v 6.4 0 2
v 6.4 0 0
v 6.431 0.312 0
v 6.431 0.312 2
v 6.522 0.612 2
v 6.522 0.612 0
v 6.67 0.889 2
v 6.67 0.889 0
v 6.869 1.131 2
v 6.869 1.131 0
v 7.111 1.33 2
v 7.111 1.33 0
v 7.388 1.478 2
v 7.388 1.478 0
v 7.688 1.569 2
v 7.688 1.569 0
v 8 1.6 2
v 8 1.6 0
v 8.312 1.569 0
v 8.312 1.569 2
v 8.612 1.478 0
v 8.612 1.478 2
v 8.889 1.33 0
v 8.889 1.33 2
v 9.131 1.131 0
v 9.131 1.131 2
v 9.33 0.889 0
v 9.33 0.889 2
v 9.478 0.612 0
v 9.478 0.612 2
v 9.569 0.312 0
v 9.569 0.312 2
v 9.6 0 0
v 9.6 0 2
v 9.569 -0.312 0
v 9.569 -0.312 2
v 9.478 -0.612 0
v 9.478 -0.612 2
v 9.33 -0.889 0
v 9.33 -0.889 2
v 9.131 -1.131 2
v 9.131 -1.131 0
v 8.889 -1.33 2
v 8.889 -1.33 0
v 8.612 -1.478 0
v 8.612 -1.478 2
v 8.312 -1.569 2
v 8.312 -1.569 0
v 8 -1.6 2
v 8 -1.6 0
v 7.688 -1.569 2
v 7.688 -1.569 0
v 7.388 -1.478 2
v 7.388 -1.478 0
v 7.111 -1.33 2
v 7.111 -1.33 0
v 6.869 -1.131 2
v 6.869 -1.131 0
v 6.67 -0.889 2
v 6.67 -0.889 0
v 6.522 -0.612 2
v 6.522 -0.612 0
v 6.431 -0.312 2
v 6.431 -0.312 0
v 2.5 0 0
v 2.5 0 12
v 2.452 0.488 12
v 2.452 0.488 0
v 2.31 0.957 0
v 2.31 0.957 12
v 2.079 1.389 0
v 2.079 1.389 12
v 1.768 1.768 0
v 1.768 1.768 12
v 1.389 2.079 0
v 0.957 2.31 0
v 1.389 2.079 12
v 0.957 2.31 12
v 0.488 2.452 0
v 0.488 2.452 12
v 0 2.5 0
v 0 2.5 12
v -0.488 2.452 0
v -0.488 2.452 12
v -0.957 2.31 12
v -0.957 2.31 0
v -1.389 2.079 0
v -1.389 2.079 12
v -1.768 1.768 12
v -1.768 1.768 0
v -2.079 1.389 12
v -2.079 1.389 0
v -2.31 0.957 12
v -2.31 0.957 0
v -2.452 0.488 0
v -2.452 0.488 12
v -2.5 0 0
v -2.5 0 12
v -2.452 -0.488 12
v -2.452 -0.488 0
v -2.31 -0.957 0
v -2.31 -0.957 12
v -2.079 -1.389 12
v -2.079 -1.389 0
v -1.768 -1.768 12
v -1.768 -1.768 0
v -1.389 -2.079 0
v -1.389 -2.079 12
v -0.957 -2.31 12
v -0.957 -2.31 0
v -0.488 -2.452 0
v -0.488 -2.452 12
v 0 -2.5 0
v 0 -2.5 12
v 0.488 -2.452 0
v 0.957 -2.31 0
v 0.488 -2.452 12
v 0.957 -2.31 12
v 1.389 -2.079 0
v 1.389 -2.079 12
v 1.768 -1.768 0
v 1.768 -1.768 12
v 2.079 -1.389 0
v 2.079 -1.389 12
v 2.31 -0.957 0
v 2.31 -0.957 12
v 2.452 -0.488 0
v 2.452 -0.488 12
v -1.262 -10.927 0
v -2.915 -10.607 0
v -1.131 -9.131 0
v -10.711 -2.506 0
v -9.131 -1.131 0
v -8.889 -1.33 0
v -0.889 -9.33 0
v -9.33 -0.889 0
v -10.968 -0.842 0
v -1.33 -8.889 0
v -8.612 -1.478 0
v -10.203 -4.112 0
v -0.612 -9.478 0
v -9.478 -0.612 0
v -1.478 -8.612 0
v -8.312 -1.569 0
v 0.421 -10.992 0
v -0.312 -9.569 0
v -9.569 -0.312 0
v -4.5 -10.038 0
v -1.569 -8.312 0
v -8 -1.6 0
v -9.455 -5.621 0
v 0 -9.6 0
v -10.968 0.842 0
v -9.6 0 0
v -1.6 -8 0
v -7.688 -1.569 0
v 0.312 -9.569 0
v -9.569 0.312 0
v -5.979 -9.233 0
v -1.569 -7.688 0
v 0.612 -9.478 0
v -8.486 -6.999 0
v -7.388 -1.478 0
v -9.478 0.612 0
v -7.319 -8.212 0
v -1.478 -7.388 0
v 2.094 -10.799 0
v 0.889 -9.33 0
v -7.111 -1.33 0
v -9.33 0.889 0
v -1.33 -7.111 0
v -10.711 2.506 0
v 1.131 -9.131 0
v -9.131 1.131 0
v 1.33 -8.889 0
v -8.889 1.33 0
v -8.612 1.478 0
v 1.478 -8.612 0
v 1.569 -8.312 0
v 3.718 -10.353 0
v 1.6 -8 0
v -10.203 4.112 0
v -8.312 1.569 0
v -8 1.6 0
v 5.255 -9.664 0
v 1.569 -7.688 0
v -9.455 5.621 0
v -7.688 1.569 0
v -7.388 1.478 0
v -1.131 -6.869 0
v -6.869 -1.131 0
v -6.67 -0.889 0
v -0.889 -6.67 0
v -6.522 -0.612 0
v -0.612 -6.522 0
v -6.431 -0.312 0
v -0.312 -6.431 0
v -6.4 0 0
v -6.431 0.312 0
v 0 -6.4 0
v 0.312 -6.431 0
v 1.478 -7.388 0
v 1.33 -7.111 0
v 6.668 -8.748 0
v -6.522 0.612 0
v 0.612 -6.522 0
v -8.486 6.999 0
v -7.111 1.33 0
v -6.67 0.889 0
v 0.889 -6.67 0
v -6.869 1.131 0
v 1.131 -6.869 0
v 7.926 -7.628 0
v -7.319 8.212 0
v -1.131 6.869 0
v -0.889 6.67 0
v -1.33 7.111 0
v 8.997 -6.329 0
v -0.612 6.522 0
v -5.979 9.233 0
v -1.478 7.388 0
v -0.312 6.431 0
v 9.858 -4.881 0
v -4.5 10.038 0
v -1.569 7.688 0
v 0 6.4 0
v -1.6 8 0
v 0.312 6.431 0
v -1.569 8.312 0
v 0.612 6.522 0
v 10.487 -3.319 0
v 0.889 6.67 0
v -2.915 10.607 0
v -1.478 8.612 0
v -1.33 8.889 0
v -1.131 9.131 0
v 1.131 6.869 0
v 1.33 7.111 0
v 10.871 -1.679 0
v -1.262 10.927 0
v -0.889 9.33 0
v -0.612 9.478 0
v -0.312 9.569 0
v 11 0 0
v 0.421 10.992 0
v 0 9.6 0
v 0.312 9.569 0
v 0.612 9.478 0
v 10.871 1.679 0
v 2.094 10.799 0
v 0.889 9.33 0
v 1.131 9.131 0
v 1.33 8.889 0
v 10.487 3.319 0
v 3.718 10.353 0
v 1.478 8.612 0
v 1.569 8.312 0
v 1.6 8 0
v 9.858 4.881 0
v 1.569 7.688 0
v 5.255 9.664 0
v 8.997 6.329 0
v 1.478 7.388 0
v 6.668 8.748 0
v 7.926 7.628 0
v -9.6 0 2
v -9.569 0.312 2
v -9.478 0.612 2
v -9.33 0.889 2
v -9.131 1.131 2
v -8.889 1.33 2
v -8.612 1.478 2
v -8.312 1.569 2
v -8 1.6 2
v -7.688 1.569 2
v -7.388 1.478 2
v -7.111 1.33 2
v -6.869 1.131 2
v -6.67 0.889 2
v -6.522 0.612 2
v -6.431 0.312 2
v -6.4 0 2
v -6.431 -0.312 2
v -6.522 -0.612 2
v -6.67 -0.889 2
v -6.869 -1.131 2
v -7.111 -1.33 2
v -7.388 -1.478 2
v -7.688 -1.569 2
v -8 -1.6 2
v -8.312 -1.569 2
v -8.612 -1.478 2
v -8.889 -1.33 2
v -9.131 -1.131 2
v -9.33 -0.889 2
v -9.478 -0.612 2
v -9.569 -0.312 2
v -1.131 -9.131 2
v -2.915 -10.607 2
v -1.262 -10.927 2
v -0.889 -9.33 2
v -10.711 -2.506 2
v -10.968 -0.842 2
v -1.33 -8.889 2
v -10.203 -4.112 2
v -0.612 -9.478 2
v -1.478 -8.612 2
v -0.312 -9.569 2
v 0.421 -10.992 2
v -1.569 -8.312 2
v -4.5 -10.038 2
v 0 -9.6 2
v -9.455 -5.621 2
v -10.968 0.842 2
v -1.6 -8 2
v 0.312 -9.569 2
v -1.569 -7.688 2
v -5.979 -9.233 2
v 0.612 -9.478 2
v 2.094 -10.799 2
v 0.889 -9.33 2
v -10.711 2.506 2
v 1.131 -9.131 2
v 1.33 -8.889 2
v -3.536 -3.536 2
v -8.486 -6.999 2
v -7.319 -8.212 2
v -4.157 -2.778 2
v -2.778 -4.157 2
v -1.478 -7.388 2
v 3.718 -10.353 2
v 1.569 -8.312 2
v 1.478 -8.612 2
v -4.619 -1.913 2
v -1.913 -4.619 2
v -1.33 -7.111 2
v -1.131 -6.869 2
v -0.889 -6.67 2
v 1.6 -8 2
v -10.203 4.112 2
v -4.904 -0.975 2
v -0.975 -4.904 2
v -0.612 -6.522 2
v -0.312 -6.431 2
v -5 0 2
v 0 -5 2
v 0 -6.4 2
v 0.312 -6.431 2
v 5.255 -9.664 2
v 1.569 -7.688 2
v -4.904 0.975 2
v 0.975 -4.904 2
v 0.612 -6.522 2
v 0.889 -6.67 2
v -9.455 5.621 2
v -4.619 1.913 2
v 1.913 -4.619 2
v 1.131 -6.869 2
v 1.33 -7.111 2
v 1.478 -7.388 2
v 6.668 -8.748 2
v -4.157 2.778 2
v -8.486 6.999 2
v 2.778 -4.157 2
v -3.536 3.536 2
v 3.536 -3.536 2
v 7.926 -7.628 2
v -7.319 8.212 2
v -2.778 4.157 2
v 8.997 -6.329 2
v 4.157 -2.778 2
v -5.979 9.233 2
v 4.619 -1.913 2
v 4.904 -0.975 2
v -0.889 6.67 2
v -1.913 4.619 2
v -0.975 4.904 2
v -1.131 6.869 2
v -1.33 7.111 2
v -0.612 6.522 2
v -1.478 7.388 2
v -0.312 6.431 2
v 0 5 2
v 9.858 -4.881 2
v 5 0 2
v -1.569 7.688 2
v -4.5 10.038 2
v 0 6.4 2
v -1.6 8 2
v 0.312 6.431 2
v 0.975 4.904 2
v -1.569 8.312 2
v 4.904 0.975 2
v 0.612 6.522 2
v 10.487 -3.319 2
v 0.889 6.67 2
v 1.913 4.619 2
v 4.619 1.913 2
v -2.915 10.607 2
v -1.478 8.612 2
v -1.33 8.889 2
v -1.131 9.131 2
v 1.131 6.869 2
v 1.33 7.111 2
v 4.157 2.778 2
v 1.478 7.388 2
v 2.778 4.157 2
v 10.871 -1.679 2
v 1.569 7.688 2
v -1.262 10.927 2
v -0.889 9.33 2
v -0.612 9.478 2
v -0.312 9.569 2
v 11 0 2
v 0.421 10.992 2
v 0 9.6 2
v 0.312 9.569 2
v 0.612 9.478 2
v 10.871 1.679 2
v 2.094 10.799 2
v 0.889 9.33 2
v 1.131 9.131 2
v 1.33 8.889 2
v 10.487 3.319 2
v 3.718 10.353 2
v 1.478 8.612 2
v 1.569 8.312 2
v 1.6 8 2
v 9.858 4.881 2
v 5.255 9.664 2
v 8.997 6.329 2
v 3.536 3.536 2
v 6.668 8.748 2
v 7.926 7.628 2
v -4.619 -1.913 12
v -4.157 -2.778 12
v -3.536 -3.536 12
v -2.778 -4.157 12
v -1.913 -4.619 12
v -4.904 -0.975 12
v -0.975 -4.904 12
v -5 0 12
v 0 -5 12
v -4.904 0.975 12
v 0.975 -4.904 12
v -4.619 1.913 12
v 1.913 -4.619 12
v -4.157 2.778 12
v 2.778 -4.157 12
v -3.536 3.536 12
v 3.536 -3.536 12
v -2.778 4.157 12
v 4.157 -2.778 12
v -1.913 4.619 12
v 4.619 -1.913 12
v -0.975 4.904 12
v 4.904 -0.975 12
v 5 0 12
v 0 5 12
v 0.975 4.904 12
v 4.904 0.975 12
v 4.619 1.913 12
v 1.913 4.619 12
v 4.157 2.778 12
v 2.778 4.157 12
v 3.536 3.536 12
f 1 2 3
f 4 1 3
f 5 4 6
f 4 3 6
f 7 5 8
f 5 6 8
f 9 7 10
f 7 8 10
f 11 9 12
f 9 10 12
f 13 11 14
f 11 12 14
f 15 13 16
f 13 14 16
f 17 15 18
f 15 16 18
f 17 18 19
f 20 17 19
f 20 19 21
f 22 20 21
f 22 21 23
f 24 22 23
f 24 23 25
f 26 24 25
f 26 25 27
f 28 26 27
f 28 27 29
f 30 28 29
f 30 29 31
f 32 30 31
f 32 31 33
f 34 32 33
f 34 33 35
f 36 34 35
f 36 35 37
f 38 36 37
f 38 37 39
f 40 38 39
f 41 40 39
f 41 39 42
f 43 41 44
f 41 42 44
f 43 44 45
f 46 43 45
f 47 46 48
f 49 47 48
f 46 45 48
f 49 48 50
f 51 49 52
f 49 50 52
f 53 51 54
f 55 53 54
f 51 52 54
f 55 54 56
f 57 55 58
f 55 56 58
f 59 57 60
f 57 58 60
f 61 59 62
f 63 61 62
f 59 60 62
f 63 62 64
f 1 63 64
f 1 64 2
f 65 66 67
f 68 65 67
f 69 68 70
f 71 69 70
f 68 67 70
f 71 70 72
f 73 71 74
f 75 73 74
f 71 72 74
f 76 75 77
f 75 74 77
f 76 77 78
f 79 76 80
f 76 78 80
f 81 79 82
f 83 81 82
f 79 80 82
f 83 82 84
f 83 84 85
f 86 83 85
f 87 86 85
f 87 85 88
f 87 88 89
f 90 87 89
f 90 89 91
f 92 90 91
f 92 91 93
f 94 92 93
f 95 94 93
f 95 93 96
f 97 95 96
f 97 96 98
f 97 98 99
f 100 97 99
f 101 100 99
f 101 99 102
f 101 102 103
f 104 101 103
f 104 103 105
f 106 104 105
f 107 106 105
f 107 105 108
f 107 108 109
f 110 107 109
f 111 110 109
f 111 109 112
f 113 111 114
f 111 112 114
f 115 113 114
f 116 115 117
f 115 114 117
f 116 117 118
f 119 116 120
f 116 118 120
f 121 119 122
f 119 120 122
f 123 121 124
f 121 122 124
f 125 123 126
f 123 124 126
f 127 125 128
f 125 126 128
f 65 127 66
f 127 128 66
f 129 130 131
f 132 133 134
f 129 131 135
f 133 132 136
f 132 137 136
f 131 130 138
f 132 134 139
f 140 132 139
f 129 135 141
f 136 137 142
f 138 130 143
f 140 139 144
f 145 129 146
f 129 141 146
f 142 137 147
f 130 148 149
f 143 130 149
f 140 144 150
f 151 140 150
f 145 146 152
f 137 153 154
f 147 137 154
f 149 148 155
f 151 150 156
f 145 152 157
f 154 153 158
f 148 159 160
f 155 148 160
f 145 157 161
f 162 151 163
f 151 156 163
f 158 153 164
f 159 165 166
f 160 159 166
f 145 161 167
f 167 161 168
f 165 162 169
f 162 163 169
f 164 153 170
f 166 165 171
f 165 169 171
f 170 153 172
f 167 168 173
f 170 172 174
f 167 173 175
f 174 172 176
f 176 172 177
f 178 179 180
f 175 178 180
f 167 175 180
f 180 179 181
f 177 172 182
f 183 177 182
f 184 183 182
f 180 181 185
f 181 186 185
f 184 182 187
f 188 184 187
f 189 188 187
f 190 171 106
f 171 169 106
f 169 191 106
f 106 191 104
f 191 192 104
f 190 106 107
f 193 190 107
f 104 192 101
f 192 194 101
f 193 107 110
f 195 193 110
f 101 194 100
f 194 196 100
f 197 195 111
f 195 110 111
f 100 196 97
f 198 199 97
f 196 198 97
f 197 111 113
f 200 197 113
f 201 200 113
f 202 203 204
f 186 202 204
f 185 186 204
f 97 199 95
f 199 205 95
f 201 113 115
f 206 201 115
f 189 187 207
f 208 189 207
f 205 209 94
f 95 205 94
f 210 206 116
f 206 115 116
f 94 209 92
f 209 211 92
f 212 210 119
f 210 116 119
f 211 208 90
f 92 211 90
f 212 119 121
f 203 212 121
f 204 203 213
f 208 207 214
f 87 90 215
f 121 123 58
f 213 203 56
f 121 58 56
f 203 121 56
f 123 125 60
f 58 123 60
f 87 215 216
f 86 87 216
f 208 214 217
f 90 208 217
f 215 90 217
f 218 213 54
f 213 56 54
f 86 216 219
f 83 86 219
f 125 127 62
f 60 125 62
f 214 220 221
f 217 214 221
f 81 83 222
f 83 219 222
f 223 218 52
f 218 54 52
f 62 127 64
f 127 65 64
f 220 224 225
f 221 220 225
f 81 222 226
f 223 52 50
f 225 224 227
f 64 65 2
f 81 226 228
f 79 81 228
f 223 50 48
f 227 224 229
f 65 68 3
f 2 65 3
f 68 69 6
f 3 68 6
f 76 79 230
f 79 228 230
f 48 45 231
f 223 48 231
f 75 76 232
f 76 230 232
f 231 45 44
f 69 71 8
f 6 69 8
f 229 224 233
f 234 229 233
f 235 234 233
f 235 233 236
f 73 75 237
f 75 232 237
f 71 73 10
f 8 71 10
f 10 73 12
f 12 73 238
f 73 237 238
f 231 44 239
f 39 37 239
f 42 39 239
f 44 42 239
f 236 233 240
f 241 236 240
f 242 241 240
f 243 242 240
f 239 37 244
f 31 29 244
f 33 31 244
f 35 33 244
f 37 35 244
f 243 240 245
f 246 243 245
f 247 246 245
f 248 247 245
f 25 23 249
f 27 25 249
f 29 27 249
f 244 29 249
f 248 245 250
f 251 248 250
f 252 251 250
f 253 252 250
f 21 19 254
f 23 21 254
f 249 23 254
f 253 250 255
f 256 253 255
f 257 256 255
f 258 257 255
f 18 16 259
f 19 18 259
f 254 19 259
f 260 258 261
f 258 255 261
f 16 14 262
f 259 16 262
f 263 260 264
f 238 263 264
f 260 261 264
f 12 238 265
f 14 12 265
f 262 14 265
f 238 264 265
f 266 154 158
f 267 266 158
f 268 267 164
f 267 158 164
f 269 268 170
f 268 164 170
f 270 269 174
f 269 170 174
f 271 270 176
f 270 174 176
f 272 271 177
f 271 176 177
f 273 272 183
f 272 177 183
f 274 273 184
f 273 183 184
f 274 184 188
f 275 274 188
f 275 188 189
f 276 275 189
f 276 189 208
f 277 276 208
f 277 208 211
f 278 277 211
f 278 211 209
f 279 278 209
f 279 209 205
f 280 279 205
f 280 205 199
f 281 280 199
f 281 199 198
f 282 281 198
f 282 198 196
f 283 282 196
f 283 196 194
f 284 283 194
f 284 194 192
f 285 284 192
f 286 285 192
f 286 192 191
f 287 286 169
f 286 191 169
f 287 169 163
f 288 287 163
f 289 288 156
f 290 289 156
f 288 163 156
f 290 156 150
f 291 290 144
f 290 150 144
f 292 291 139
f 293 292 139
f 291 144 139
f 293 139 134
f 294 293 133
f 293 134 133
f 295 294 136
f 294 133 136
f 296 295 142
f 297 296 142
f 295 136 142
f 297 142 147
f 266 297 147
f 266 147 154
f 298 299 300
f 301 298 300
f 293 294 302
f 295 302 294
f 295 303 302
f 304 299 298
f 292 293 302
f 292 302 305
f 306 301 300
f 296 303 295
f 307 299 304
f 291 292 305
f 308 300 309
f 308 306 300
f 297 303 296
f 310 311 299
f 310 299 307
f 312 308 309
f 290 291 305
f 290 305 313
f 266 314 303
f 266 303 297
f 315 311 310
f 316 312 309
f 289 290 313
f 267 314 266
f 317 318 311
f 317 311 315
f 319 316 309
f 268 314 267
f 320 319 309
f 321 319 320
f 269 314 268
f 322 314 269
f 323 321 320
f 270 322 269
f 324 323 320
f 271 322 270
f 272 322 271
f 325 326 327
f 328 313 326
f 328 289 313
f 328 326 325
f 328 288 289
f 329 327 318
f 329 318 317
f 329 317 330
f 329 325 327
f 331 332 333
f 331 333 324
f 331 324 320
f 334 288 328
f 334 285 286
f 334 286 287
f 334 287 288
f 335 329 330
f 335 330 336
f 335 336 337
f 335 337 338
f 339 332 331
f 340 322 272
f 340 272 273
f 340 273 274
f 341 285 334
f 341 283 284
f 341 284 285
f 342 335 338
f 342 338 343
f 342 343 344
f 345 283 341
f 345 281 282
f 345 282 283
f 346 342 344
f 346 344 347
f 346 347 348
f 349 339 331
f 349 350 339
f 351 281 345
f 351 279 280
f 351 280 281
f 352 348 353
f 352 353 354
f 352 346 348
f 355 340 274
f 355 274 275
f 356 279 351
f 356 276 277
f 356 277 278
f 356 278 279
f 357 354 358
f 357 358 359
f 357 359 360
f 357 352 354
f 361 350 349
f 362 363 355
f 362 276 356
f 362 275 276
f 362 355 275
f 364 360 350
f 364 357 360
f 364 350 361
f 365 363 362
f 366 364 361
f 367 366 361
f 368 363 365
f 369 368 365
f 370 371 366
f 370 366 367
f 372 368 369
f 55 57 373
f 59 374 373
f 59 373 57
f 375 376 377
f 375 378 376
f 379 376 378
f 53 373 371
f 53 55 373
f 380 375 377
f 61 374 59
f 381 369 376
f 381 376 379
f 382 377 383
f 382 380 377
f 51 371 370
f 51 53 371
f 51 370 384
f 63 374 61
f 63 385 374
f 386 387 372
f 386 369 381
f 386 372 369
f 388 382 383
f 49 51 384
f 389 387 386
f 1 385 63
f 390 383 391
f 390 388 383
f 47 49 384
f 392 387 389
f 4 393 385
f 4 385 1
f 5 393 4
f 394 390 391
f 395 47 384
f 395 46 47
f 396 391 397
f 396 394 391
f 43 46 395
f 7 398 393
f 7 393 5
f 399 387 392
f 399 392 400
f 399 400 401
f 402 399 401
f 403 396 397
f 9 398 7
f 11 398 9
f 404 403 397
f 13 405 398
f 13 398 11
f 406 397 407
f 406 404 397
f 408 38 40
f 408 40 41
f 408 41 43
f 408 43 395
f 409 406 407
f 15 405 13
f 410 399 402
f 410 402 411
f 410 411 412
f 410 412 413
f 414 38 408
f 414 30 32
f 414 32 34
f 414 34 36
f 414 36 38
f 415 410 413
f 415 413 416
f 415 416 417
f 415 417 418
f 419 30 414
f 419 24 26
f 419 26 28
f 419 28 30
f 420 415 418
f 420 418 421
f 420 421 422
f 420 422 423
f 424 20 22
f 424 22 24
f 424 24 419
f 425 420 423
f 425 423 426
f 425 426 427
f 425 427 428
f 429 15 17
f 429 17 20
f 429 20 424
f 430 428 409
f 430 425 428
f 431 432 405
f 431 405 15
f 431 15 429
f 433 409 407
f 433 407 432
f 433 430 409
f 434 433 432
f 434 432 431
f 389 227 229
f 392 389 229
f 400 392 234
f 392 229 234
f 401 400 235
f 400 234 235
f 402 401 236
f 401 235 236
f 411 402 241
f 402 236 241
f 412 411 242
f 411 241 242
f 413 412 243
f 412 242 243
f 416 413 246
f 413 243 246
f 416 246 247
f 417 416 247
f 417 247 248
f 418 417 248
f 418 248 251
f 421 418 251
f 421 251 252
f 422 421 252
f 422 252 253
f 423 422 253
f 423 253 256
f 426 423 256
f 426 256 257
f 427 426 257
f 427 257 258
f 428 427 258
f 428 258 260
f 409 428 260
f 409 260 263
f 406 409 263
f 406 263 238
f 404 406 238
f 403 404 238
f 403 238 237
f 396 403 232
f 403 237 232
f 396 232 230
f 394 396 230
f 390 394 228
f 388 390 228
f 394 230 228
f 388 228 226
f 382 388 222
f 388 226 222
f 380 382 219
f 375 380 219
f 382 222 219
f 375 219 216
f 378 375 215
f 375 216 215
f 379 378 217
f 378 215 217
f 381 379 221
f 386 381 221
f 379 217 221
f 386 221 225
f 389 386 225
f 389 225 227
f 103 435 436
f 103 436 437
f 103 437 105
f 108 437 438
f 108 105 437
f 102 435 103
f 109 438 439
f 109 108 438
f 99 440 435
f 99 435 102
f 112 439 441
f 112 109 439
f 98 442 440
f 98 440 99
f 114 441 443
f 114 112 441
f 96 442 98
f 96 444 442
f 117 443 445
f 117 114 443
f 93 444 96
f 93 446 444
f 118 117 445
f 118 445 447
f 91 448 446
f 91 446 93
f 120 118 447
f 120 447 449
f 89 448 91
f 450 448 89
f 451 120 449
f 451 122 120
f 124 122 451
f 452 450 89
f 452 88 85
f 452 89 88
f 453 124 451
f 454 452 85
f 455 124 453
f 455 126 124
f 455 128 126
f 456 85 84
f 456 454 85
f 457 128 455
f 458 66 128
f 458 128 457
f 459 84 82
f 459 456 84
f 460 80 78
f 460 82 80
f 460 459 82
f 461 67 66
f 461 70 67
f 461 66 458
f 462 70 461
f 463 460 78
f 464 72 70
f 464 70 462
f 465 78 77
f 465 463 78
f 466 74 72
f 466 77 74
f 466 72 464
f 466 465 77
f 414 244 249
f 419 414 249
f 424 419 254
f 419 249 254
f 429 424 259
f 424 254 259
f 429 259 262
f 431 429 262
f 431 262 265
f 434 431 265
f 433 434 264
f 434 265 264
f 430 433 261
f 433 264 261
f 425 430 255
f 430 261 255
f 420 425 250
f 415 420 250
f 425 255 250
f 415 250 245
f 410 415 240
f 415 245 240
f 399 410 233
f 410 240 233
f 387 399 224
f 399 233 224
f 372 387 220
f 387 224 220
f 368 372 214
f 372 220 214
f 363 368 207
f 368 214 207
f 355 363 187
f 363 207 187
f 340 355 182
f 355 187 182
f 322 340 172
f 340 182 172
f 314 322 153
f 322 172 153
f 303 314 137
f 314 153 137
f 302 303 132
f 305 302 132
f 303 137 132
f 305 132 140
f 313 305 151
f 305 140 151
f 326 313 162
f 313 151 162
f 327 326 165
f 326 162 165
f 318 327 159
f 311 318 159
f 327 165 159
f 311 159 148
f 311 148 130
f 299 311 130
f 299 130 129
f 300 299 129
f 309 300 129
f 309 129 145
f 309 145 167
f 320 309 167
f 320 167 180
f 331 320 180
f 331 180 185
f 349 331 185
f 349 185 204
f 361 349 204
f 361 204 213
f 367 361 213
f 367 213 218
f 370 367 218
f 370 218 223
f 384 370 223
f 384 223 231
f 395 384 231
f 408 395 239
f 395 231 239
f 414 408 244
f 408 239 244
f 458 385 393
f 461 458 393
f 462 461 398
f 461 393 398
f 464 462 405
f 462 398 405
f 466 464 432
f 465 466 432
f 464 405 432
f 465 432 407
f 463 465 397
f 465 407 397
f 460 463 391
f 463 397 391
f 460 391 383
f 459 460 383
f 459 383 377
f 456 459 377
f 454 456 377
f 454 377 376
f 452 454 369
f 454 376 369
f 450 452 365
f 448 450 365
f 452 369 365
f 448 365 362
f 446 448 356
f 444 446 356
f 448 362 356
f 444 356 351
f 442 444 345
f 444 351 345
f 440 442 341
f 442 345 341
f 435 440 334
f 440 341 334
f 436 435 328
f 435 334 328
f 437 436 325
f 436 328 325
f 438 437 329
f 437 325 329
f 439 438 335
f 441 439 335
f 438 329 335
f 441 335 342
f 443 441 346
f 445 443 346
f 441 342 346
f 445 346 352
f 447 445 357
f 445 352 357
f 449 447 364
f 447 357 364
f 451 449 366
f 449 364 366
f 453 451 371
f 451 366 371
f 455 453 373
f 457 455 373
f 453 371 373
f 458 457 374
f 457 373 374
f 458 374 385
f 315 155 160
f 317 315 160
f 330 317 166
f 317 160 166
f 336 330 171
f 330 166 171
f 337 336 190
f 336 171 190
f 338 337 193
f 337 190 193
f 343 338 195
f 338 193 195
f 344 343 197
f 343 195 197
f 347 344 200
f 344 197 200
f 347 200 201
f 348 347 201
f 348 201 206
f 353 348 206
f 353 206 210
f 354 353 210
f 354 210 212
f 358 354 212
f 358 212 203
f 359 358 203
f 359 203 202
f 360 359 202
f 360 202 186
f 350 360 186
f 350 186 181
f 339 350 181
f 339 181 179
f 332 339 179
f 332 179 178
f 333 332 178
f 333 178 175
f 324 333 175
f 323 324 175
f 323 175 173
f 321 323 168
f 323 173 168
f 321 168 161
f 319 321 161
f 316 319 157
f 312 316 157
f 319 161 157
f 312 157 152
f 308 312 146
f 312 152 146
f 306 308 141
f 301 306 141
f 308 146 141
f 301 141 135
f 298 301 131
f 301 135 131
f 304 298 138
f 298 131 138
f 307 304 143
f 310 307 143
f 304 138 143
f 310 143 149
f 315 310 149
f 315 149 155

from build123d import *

# Parameters (mm, degrees)
SKETCH_1_R                  = 11
EXTRUDE_1_DEPTH             = 2
SKETCH_2_R                  = 5
EXTRUDE_2_DEPTH             = 10
SKETCH_3_R                  = 2.5
CUT_EXTRUDE_1_DEPTH         = 20.646882704
HOLE_WIZARD_3_2_3_2_1_D     = 3.2
HOLE_WIZARD_3_2_3_2_1_DEPTH = 10
HOLE_WIZARD_3_2_3_2_1_TIP   = 0.96137699


with BuildPart() as part:
    # 草图1 → 凸台-拉伸1 (new body)
    with BuildSketch(Plane.XY):
        Circle(SKETCH_1_R)
    extrude(amount=EXTRUDE_1_DEPTH)

    # 草图2 → 凸台-拉伸2 (add)
    with BuildSketch(Plane.XY.offset(2)):
        Circle(SKETCH_2_R)
    extrude(amount=EXTRUDE_2_DEPTH)

    # 草图3 → 切除-拉伸1 (cut, through all)
    with BuildSketch(Plane.XY.offset(12)):
        Circle(SKETCH_3_R)
    extrude(amount=-CUT_EXTRUDE_1_DEPTH, mode=Mode.SUBTRACT)

    # Ø3.2 (3.2) 直径孔1
    with Locations(Plane.XY.offset(2)):
        with Locations((8, 0), (-8, 0), (0, -8), (0, 8)):
            Hole(HOLE_WIZARD_3_2_3_2_1_D / 2, depth=HOLE_WIZARD_3_2_3_2_1_DEPTH)
            with Locations((0, 0, -(HOLE_WIZARD_3_2_3_2_1_DEPTH + HOLE_WIZARD_3_2_3_2_1_TIP / 2))):  # 118° drill point
                Cone(0, HOLE_WIZARD_3_2_3_2_1_D / 2, HOLE_WIZARD_3_2_3_2_1_TIP, mode=Mode.SUBTRACT)


solid = part.part
